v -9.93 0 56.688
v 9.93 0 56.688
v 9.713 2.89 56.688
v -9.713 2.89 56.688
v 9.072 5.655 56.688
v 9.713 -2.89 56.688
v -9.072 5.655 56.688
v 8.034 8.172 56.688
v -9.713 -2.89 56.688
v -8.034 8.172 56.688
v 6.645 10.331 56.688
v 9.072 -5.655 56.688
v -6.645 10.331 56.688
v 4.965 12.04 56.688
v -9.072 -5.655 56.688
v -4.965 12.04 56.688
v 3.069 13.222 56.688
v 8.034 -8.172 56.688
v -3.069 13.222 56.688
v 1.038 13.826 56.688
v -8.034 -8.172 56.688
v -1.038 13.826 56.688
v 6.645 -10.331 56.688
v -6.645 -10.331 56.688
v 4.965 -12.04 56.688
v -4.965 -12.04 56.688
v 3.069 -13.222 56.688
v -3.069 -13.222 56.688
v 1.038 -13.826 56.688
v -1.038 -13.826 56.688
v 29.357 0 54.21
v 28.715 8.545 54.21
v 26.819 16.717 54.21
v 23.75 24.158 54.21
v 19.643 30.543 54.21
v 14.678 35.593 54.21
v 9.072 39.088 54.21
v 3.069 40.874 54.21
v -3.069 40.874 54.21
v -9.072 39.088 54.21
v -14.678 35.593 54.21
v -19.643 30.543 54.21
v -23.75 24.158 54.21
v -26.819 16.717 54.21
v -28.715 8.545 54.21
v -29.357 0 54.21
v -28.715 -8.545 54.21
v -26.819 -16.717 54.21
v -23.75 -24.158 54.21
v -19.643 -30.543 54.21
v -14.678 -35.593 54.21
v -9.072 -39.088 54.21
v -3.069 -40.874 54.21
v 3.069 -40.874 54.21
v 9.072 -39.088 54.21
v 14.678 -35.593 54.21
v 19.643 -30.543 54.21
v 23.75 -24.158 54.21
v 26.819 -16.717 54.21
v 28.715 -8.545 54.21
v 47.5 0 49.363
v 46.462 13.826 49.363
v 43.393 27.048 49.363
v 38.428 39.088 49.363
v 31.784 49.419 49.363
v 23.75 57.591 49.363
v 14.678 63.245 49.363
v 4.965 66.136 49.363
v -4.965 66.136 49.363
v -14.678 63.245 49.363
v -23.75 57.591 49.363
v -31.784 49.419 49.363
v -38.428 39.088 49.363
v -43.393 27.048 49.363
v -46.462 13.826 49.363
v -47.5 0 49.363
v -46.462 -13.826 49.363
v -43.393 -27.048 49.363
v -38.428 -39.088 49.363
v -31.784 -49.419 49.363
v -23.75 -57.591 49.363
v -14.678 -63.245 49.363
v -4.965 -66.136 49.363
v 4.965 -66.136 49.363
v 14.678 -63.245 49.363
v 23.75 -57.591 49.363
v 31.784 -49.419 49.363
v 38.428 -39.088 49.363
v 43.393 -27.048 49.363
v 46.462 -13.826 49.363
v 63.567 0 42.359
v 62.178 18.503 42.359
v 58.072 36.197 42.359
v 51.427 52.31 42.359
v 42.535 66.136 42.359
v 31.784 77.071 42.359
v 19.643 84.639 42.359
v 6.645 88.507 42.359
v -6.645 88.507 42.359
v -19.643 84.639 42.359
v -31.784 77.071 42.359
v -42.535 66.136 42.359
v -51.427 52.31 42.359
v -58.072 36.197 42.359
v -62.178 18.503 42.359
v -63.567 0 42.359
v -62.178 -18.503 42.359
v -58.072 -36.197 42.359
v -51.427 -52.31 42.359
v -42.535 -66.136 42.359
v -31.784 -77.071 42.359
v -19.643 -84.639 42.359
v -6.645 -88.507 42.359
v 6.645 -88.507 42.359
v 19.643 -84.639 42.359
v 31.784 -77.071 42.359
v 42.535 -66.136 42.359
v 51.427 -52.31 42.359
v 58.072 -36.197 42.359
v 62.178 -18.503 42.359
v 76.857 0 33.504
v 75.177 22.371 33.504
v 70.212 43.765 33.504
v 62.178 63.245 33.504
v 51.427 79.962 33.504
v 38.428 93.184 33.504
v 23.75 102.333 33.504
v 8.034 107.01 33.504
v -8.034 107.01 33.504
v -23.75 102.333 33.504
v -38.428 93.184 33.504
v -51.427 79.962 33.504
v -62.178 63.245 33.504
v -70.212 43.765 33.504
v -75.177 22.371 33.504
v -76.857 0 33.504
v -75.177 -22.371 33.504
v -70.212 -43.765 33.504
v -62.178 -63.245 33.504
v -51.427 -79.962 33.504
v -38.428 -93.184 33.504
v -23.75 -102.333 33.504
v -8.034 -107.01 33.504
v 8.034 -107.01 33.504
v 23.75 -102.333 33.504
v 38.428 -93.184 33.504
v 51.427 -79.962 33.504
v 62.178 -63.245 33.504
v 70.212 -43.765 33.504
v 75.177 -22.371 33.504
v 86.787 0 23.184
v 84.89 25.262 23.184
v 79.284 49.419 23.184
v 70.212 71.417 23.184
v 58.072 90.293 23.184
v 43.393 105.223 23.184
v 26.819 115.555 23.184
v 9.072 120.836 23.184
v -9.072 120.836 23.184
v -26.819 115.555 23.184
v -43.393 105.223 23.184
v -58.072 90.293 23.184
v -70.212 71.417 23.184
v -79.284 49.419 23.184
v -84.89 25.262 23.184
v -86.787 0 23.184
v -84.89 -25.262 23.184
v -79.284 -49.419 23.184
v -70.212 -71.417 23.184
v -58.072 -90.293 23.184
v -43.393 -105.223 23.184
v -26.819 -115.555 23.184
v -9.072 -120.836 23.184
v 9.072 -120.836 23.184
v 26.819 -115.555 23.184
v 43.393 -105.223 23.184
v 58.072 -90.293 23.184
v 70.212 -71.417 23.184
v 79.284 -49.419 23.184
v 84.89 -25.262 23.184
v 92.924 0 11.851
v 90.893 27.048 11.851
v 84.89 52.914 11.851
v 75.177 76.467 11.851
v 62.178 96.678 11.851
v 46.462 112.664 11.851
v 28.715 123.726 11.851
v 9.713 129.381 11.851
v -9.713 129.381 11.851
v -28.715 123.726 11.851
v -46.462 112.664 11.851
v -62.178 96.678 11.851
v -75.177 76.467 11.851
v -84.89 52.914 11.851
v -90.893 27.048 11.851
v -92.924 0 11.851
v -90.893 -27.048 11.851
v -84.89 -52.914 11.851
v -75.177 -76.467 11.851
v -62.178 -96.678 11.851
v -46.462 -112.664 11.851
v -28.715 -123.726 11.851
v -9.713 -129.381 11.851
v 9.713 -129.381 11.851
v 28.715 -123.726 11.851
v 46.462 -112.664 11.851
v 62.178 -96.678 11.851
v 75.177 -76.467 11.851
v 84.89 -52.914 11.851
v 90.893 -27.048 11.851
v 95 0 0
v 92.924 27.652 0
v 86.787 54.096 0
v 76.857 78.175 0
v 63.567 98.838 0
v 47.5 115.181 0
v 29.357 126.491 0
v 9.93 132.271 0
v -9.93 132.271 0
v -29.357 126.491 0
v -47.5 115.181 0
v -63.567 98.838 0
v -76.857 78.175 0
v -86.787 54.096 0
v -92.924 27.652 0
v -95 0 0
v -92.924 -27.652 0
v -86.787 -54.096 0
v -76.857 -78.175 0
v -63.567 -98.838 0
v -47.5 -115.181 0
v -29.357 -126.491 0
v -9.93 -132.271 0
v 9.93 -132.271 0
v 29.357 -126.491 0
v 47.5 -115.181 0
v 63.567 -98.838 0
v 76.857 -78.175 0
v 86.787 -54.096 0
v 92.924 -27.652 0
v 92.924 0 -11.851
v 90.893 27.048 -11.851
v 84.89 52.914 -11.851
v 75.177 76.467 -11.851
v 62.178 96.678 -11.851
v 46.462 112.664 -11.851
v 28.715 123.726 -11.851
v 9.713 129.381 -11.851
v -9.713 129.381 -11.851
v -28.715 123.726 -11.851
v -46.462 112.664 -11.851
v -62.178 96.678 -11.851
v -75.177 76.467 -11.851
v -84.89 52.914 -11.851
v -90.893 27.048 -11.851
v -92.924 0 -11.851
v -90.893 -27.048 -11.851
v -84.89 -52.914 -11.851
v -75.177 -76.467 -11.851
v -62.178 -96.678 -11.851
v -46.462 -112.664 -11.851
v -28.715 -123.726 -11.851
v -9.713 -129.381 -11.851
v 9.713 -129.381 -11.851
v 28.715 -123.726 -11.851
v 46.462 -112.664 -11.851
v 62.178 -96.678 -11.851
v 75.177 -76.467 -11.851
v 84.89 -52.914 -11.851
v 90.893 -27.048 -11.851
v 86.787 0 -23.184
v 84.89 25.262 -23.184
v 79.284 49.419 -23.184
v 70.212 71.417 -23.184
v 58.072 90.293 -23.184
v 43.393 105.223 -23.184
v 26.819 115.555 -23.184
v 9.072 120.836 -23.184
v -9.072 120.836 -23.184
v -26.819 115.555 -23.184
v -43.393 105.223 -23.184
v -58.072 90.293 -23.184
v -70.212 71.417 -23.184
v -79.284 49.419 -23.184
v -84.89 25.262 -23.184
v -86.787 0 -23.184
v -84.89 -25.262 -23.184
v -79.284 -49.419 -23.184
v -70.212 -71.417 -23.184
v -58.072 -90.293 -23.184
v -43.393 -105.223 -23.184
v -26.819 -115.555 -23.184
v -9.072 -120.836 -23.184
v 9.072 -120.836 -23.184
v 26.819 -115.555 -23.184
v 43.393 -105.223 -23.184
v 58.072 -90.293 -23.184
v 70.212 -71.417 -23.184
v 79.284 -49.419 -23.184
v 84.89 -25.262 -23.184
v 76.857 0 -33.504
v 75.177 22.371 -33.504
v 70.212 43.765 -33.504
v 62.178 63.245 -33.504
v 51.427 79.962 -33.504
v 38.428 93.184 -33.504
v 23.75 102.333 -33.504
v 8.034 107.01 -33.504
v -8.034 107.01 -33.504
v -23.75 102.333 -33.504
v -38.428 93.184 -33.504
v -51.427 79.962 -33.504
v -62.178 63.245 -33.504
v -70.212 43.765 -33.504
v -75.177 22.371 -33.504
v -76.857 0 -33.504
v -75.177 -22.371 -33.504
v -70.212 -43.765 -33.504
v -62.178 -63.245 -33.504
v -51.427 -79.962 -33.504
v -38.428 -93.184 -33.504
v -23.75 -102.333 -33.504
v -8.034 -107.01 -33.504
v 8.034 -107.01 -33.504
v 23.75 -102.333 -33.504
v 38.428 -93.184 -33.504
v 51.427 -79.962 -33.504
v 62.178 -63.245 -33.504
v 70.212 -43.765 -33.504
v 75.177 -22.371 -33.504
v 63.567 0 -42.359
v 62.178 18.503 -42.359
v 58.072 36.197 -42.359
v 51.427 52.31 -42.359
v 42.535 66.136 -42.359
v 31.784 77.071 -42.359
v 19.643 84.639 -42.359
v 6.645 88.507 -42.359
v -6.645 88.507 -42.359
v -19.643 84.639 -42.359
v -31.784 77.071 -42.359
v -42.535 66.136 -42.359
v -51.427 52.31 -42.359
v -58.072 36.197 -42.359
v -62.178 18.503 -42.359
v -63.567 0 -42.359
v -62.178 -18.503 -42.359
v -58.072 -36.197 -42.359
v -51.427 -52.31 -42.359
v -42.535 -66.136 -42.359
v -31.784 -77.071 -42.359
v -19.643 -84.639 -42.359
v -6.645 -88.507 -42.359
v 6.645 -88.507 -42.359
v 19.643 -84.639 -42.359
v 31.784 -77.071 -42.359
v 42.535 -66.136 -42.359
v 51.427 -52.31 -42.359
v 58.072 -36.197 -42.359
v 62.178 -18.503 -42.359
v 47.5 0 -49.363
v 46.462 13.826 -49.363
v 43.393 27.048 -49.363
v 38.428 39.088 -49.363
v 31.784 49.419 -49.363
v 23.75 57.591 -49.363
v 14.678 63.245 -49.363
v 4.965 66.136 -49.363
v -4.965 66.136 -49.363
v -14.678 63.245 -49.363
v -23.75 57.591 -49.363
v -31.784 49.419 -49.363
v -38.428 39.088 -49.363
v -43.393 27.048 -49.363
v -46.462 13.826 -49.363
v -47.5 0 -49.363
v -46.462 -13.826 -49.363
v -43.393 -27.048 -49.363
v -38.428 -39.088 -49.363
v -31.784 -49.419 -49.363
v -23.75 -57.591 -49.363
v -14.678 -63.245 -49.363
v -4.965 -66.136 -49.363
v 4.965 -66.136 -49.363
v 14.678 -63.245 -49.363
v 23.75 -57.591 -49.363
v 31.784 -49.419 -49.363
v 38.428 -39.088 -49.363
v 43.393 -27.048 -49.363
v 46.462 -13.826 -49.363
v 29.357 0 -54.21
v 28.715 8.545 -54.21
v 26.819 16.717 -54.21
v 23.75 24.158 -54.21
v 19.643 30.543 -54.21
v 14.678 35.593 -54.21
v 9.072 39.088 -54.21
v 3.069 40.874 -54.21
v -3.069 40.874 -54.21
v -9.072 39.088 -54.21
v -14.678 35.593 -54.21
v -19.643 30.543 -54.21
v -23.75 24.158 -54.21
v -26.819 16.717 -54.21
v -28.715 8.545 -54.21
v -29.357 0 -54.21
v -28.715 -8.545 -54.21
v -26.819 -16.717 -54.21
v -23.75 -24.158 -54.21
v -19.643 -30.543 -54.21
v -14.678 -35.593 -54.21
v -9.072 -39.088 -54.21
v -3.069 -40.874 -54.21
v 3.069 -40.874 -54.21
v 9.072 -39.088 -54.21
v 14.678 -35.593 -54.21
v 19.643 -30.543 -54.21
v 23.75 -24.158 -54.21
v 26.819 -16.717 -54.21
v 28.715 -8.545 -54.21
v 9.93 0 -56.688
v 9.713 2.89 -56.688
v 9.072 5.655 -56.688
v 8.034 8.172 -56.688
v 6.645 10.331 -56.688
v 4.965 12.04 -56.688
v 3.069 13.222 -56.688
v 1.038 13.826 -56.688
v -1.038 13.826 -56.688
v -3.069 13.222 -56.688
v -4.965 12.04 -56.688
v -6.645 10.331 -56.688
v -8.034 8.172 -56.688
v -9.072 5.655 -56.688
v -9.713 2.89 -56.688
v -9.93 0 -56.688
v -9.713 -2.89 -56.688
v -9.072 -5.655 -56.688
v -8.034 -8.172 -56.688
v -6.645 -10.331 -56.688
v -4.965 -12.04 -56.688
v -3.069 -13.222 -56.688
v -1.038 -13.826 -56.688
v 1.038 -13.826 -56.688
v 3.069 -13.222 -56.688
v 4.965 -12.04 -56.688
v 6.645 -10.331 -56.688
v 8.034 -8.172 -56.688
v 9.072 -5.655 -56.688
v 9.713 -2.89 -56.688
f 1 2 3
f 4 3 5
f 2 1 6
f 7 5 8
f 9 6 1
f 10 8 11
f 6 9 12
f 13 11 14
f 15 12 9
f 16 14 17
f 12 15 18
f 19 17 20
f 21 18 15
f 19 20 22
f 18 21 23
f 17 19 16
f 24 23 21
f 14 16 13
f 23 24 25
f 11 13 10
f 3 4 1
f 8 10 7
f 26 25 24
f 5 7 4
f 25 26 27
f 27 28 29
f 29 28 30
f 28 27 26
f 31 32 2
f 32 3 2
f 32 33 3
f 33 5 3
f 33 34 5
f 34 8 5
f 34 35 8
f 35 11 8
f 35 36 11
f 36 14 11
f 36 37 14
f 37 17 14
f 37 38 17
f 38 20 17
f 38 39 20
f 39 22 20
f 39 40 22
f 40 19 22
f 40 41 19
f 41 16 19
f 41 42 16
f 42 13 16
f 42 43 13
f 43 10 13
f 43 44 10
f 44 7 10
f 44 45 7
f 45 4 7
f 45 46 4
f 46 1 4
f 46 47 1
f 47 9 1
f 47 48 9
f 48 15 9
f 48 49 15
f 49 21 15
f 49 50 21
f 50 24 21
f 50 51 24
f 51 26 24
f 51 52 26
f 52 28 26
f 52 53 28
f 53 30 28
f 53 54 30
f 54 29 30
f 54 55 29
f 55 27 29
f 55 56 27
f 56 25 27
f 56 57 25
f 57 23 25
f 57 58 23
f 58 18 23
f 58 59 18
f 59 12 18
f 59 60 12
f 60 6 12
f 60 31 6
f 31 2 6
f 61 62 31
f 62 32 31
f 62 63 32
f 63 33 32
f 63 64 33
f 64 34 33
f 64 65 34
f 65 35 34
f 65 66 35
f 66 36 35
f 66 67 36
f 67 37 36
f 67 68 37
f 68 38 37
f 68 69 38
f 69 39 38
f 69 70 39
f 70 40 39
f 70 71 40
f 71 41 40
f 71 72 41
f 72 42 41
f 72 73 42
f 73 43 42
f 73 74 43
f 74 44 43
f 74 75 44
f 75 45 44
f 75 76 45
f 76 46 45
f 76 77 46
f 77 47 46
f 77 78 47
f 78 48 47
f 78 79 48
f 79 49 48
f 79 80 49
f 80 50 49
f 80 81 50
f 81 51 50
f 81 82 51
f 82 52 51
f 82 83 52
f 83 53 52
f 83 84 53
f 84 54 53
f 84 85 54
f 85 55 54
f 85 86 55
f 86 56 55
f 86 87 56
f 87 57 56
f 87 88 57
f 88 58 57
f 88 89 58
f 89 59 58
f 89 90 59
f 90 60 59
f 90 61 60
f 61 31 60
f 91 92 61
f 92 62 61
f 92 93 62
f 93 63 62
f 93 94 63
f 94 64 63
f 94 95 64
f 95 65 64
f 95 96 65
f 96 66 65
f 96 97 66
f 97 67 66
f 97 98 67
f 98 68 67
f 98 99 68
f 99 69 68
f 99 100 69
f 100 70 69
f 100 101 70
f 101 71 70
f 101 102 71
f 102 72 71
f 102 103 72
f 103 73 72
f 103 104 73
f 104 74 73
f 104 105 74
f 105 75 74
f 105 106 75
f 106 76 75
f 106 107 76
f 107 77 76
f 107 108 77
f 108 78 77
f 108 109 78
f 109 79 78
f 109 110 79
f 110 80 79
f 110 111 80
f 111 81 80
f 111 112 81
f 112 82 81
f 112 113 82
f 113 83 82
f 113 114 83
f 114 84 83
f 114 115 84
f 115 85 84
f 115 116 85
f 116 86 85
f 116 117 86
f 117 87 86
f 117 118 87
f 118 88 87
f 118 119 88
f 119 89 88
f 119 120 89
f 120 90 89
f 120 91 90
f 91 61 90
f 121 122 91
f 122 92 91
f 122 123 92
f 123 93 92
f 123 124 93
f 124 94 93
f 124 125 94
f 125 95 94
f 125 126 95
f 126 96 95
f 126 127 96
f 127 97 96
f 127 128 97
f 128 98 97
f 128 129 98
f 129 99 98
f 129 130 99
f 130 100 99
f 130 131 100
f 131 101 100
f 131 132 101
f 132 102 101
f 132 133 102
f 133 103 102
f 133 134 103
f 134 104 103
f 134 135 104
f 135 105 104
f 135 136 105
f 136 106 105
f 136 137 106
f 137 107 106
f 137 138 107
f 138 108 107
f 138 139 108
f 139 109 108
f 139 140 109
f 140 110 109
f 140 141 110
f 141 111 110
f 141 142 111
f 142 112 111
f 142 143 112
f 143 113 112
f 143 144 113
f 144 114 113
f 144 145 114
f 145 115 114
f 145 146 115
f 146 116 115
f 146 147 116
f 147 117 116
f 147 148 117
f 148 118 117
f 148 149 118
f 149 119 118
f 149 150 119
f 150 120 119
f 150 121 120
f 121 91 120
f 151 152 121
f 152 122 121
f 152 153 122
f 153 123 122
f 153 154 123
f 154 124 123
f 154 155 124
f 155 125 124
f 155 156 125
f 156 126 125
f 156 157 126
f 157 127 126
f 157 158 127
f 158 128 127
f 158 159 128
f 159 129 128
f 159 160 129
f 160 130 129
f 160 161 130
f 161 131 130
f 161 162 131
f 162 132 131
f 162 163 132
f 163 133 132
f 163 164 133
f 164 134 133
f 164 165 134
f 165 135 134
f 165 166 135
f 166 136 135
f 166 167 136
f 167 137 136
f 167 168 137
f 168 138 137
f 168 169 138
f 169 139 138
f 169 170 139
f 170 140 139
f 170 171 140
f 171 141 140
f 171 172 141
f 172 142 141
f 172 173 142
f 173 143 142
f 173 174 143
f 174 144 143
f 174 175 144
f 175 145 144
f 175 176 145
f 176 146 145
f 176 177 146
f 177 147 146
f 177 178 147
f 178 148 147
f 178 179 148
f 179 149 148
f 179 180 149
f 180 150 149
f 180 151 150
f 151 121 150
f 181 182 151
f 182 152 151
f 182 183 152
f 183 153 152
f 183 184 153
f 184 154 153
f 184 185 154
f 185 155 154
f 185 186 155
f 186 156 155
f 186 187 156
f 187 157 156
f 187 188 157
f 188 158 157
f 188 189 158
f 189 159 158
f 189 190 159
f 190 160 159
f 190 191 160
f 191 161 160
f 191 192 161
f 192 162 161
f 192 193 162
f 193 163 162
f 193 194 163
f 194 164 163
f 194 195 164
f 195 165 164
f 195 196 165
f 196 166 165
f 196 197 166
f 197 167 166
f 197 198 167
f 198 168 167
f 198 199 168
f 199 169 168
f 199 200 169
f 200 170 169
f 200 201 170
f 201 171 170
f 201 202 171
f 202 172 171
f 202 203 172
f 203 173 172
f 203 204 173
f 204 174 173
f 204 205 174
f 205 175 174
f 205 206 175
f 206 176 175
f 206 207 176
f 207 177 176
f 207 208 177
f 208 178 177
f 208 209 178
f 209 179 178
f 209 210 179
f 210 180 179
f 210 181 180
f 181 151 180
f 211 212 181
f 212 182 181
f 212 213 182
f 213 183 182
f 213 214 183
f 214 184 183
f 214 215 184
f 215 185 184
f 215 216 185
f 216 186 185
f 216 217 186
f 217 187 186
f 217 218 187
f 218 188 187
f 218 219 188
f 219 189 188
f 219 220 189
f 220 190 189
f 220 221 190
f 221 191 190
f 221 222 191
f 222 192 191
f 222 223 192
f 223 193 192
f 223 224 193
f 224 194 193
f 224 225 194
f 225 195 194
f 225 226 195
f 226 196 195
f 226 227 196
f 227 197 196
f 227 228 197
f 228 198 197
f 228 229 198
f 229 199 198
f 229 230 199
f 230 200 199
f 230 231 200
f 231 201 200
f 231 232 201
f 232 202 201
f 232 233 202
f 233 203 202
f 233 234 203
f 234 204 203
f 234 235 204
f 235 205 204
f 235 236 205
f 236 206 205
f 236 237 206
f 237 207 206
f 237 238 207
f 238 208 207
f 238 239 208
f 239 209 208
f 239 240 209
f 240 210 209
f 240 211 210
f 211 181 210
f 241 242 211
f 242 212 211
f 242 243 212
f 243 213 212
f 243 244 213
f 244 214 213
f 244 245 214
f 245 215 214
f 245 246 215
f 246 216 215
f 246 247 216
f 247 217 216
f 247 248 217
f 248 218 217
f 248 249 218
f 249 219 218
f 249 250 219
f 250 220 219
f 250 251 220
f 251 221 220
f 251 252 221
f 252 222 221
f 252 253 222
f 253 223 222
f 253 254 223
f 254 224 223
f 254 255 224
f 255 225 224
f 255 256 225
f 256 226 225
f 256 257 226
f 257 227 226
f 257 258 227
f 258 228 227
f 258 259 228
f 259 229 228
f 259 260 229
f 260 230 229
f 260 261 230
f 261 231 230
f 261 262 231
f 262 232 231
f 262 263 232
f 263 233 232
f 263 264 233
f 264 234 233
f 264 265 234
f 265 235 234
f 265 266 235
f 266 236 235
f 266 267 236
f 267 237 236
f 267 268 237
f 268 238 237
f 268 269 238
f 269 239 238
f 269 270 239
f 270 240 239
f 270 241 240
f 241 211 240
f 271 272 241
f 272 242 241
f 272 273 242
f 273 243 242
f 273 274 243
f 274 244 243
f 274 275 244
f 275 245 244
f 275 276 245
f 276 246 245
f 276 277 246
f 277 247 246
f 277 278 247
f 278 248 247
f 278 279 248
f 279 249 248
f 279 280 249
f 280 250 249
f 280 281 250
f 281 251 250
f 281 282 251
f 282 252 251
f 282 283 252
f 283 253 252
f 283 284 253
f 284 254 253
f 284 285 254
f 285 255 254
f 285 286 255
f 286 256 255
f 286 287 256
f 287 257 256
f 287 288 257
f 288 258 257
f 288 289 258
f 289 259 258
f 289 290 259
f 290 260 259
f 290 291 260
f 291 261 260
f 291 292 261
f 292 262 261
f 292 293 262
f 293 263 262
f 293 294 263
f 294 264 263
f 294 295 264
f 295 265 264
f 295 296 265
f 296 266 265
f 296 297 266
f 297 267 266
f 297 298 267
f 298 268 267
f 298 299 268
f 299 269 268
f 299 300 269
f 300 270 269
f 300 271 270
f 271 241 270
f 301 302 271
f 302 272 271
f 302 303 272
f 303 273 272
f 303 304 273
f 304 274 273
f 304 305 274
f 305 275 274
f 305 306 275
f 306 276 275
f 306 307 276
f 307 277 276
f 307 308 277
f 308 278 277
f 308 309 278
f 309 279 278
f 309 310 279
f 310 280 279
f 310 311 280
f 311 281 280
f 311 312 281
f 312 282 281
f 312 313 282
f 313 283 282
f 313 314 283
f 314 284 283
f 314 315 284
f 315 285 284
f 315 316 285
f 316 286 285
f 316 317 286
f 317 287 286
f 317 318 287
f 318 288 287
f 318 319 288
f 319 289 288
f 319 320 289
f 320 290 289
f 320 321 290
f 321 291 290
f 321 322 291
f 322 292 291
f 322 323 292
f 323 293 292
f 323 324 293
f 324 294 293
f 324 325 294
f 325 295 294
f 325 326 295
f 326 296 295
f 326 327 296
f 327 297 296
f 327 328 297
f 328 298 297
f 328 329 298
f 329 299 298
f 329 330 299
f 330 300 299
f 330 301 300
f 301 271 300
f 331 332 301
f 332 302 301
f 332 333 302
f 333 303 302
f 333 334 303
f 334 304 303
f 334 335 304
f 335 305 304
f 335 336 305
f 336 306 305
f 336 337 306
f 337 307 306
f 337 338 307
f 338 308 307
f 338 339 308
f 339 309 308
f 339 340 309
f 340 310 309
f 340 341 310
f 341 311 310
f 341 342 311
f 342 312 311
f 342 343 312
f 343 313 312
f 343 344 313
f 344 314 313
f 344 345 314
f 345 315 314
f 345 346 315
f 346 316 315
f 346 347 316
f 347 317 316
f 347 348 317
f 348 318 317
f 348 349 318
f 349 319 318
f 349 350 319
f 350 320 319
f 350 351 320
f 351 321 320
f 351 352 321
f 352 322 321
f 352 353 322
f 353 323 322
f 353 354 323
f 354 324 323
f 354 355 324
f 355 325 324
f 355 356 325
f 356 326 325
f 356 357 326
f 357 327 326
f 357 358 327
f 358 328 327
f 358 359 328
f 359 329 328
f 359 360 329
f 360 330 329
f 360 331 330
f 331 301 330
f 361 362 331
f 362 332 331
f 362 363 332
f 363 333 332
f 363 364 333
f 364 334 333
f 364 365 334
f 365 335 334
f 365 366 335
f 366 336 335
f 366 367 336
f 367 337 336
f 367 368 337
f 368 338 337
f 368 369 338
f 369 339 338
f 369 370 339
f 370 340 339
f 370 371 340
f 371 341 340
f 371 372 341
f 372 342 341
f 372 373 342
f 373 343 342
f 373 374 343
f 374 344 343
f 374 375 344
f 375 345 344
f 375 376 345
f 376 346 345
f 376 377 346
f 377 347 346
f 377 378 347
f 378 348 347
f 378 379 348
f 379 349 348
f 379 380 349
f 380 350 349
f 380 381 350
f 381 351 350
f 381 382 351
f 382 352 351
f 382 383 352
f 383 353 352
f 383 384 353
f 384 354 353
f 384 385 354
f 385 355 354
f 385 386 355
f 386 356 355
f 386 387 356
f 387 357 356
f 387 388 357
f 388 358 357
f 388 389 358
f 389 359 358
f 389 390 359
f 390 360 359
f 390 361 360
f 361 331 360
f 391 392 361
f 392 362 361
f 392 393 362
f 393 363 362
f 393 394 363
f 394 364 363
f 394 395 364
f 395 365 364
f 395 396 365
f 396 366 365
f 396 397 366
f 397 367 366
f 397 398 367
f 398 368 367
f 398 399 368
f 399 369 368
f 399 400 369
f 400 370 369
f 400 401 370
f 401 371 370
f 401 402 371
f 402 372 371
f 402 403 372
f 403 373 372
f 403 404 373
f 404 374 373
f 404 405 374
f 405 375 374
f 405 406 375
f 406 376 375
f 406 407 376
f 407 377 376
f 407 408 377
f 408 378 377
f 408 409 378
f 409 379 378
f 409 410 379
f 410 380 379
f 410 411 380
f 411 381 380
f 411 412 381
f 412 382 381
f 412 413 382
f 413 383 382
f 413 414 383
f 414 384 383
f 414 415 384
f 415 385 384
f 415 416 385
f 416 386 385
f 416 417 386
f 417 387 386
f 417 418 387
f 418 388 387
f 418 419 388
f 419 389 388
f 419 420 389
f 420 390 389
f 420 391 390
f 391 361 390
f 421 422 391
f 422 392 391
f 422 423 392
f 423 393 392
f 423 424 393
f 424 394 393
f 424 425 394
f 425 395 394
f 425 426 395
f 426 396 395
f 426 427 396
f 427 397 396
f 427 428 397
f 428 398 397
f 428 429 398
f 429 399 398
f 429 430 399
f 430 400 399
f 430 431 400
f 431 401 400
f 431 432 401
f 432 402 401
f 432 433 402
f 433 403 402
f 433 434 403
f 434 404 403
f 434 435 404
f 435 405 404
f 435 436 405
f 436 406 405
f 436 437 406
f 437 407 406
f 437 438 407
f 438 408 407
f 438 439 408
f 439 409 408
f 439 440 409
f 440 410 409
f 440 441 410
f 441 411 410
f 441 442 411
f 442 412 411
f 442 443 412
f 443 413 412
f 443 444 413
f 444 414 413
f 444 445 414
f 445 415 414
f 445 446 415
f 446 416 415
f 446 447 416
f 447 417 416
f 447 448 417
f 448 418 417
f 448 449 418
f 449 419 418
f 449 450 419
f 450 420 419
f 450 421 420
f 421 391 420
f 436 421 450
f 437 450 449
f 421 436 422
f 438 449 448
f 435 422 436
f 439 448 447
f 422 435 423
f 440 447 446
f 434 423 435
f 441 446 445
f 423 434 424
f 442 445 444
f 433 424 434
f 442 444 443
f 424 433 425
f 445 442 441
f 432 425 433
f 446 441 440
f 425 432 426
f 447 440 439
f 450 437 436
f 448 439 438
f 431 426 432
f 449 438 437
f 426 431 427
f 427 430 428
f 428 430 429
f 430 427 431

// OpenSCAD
// Generated by SolidPython 1.0.1 on 2020-07-29 00:46:46


scale(v = [5, 7, 3]) {
	sphere(r = 19);
}
/***********************************************
*********      SolidPython code:      **********
************************************************
 
# import packages: SolidPython
from solid import *
from solid.utils import *
from itertools import chain, combinations, permutations


class Resize:

    def __init__(self, scad_file):
        self.scad_file = scad_file
        #self.scad_file = import_scad(scad_file)
        # cone/cylinder param:
        self.r1 = 0
        self.r2 = 0
        self.h = 0
        # rectangular prism param:
        self.w = 0
        self.l = 0
        # ellipse param:
        self.r = 0

    # import OpenScad code (file name corresponds to shape)


    # classify shape + parameters
    def assign(self, param1, param2, param3):
        if self.scad_file == 'cone.scad':
            self.r1 = param1
            self.r2 = param2
            self.h = param3
        elif self.scad_file == 'cylinder.scad':
            self.r1 = param1
            self.r2 = param2
            self.h = param3
        elif self.scad_file == 'rectangularPrism.scad':
            self.h = param1
            self.l = param2
            self.w = param3
        else:
            self.r = param1
            self.h = param2

    # resize parameters
    def iterate(self):
        x = range(3, 20, 2)
        i = 1
        if self.scad_file == 'cone.scad':
            tempList = list(permutations(x, 2))
            for temp in tempList:
                param1 = temp[0]
                param2 = temp[1]
                filepath = 'produced_scad_files/' + 'cone' + str(param1) + '_' + str(param2) + '_' + '.scad'
                scad_render_to_file(cylinder(h=param1, r1=param2, r2=0), filepath)

        elif self.scad_file == 'cylinder.scad':
            tempList = list(permutations(x, 3))
            for temp in tempList:
                param1 = temp[0]
                param2 = temp[1]
                filepath = 'produced_scad_files/' + 'cylinder' + str(param1) + '_' + str(param2) + '_' + '.scad'
                scad_render_to_file(cylinder(h=param1, r1=param2, r2=param2), filepath)

        elif self.scad_file == 'rectangularPrism.scad':
            tempList = list(permutations(x, 3))
            for temp in tempList:
                param1 = temp[0]
                param2 = temp[1]
                param3 = temp[2]
                filepath = 'produced_scad_files/' + 'rectangularPrism' + str(param1) + '_' + str(param2) + '_' + str(
                    param3) + '.scad'
                scad_render_to_file(cube(size=(param1, param2, param3)), filepath)

        elif self.scad_file == 'ellipse.scad':
            tempList = list(permutations(x, 4))
            for temp in tempList:
                param1 = temp[0]
                param2 = temp[1]
                param3 = temp[2]
                param4 = temp[3]
                filepath = 'produced_scad_files/' + 'ellipse' + str(param1) + '_' + str(param2) + '_' + str(param3) + '_' + str(param4) + '.scad'
                scad_render_to_file(scale([param1, param2, param3])(sphere(r=param4)), filepath)

    def render_to_scadfile(self):
        scad_render_to_file(scad, 'example.scad') 
 
************************************************/
